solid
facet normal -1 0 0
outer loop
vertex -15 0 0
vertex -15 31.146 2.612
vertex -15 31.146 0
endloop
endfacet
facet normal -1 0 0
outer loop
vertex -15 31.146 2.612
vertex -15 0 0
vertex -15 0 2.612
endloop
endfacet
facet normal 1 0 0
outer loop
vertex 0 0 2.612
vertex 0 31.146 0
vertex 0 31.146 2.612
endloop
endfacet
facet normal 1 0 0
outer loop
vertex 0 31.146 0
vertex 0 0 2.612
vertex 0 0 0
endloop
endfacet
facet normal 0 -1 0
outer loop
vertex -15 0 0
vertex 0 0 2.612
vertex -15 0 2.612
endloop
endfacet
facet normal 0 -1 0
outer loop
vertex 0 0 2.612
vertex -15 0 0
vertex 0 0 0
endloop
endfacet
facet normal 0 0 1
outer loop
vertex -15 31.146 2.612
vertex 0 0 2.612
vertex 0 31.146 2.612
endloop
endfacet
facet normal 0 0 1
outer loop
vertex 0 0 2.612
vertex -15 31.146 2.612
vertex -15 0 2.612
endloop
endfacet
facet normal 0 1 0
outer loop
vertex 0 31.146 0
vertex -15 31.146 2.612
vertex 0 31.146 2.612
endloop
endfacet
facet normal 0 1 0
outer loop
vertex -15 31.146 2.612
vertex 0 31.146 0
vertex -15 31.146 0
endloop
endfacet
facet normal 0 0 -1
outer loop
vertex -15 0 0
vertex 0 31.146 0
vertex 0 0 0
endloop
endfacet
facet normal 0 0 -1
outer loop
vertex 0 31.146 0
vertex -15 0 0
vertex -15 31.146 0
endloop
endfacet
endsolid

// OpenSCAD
// Original code: https://github.com/dvoros/3d

// table width
tw=150;
// table height
th=5;
// wall height
wh=15;
// slack
s=0.1;


// number of ditches
dn=8;
// ratio of ditch width to board width
dr=0.15;

// epsilon
e = 0.01;


// DITCHES

// width
dw=tw*dr/dn;
echo("ditch width", dw);
// height
dh=th/2;
// distance
fw=tw+dw;
dd=fw/(dn+1);

// WALLS

// width
ww=dw-2*s;
echo("wall width", ww);
wl=2*dd-dw;

// cell width
cw=dd-dw;
// pawn width
pw=0.8*cw;

//mini_board();
//board();
//pawn();
wall();

module pawn() {
    $fn=40;
    translate([0, 0, th/2])
    union() {
        linear_extrude(scale=0.2, height=wh)
        circle(d=pw);
        
        translate([0, 0, wh])
        sphere(d=0.8*pw);
    }
}

module wall() {
    rotate([0, -90, 0])
    cube(size=[ww, wl, wh]);
}

module mini_board() {
    translate([-wl/2 + tw/2, -wl/2 + tw/2, th/2])
    intersection() {
        translate([-tw + wl - e, -tw + wl - e, 0])
        cube(size=tw, center=true);
        
        board();
    }
}

module board() {
    difference() {
        blank_board();
        ditches();
    }
}

module blank_board() {
    cube(size=[tw, tw, th], center=true);
}

module ditches() {
    sx = -tw/2 -dw/2;
    for (d = [1 : dn]) {
        translate([0, sx + d*dd, dh/2 + e])
        cube(size=[tw+1, dw, th/2], center=true);
        
        translate([sx + d*dd, 0, dh/2 + e])
        cube(size=[dw, tw+1, th/2], center=true);
    }
}
